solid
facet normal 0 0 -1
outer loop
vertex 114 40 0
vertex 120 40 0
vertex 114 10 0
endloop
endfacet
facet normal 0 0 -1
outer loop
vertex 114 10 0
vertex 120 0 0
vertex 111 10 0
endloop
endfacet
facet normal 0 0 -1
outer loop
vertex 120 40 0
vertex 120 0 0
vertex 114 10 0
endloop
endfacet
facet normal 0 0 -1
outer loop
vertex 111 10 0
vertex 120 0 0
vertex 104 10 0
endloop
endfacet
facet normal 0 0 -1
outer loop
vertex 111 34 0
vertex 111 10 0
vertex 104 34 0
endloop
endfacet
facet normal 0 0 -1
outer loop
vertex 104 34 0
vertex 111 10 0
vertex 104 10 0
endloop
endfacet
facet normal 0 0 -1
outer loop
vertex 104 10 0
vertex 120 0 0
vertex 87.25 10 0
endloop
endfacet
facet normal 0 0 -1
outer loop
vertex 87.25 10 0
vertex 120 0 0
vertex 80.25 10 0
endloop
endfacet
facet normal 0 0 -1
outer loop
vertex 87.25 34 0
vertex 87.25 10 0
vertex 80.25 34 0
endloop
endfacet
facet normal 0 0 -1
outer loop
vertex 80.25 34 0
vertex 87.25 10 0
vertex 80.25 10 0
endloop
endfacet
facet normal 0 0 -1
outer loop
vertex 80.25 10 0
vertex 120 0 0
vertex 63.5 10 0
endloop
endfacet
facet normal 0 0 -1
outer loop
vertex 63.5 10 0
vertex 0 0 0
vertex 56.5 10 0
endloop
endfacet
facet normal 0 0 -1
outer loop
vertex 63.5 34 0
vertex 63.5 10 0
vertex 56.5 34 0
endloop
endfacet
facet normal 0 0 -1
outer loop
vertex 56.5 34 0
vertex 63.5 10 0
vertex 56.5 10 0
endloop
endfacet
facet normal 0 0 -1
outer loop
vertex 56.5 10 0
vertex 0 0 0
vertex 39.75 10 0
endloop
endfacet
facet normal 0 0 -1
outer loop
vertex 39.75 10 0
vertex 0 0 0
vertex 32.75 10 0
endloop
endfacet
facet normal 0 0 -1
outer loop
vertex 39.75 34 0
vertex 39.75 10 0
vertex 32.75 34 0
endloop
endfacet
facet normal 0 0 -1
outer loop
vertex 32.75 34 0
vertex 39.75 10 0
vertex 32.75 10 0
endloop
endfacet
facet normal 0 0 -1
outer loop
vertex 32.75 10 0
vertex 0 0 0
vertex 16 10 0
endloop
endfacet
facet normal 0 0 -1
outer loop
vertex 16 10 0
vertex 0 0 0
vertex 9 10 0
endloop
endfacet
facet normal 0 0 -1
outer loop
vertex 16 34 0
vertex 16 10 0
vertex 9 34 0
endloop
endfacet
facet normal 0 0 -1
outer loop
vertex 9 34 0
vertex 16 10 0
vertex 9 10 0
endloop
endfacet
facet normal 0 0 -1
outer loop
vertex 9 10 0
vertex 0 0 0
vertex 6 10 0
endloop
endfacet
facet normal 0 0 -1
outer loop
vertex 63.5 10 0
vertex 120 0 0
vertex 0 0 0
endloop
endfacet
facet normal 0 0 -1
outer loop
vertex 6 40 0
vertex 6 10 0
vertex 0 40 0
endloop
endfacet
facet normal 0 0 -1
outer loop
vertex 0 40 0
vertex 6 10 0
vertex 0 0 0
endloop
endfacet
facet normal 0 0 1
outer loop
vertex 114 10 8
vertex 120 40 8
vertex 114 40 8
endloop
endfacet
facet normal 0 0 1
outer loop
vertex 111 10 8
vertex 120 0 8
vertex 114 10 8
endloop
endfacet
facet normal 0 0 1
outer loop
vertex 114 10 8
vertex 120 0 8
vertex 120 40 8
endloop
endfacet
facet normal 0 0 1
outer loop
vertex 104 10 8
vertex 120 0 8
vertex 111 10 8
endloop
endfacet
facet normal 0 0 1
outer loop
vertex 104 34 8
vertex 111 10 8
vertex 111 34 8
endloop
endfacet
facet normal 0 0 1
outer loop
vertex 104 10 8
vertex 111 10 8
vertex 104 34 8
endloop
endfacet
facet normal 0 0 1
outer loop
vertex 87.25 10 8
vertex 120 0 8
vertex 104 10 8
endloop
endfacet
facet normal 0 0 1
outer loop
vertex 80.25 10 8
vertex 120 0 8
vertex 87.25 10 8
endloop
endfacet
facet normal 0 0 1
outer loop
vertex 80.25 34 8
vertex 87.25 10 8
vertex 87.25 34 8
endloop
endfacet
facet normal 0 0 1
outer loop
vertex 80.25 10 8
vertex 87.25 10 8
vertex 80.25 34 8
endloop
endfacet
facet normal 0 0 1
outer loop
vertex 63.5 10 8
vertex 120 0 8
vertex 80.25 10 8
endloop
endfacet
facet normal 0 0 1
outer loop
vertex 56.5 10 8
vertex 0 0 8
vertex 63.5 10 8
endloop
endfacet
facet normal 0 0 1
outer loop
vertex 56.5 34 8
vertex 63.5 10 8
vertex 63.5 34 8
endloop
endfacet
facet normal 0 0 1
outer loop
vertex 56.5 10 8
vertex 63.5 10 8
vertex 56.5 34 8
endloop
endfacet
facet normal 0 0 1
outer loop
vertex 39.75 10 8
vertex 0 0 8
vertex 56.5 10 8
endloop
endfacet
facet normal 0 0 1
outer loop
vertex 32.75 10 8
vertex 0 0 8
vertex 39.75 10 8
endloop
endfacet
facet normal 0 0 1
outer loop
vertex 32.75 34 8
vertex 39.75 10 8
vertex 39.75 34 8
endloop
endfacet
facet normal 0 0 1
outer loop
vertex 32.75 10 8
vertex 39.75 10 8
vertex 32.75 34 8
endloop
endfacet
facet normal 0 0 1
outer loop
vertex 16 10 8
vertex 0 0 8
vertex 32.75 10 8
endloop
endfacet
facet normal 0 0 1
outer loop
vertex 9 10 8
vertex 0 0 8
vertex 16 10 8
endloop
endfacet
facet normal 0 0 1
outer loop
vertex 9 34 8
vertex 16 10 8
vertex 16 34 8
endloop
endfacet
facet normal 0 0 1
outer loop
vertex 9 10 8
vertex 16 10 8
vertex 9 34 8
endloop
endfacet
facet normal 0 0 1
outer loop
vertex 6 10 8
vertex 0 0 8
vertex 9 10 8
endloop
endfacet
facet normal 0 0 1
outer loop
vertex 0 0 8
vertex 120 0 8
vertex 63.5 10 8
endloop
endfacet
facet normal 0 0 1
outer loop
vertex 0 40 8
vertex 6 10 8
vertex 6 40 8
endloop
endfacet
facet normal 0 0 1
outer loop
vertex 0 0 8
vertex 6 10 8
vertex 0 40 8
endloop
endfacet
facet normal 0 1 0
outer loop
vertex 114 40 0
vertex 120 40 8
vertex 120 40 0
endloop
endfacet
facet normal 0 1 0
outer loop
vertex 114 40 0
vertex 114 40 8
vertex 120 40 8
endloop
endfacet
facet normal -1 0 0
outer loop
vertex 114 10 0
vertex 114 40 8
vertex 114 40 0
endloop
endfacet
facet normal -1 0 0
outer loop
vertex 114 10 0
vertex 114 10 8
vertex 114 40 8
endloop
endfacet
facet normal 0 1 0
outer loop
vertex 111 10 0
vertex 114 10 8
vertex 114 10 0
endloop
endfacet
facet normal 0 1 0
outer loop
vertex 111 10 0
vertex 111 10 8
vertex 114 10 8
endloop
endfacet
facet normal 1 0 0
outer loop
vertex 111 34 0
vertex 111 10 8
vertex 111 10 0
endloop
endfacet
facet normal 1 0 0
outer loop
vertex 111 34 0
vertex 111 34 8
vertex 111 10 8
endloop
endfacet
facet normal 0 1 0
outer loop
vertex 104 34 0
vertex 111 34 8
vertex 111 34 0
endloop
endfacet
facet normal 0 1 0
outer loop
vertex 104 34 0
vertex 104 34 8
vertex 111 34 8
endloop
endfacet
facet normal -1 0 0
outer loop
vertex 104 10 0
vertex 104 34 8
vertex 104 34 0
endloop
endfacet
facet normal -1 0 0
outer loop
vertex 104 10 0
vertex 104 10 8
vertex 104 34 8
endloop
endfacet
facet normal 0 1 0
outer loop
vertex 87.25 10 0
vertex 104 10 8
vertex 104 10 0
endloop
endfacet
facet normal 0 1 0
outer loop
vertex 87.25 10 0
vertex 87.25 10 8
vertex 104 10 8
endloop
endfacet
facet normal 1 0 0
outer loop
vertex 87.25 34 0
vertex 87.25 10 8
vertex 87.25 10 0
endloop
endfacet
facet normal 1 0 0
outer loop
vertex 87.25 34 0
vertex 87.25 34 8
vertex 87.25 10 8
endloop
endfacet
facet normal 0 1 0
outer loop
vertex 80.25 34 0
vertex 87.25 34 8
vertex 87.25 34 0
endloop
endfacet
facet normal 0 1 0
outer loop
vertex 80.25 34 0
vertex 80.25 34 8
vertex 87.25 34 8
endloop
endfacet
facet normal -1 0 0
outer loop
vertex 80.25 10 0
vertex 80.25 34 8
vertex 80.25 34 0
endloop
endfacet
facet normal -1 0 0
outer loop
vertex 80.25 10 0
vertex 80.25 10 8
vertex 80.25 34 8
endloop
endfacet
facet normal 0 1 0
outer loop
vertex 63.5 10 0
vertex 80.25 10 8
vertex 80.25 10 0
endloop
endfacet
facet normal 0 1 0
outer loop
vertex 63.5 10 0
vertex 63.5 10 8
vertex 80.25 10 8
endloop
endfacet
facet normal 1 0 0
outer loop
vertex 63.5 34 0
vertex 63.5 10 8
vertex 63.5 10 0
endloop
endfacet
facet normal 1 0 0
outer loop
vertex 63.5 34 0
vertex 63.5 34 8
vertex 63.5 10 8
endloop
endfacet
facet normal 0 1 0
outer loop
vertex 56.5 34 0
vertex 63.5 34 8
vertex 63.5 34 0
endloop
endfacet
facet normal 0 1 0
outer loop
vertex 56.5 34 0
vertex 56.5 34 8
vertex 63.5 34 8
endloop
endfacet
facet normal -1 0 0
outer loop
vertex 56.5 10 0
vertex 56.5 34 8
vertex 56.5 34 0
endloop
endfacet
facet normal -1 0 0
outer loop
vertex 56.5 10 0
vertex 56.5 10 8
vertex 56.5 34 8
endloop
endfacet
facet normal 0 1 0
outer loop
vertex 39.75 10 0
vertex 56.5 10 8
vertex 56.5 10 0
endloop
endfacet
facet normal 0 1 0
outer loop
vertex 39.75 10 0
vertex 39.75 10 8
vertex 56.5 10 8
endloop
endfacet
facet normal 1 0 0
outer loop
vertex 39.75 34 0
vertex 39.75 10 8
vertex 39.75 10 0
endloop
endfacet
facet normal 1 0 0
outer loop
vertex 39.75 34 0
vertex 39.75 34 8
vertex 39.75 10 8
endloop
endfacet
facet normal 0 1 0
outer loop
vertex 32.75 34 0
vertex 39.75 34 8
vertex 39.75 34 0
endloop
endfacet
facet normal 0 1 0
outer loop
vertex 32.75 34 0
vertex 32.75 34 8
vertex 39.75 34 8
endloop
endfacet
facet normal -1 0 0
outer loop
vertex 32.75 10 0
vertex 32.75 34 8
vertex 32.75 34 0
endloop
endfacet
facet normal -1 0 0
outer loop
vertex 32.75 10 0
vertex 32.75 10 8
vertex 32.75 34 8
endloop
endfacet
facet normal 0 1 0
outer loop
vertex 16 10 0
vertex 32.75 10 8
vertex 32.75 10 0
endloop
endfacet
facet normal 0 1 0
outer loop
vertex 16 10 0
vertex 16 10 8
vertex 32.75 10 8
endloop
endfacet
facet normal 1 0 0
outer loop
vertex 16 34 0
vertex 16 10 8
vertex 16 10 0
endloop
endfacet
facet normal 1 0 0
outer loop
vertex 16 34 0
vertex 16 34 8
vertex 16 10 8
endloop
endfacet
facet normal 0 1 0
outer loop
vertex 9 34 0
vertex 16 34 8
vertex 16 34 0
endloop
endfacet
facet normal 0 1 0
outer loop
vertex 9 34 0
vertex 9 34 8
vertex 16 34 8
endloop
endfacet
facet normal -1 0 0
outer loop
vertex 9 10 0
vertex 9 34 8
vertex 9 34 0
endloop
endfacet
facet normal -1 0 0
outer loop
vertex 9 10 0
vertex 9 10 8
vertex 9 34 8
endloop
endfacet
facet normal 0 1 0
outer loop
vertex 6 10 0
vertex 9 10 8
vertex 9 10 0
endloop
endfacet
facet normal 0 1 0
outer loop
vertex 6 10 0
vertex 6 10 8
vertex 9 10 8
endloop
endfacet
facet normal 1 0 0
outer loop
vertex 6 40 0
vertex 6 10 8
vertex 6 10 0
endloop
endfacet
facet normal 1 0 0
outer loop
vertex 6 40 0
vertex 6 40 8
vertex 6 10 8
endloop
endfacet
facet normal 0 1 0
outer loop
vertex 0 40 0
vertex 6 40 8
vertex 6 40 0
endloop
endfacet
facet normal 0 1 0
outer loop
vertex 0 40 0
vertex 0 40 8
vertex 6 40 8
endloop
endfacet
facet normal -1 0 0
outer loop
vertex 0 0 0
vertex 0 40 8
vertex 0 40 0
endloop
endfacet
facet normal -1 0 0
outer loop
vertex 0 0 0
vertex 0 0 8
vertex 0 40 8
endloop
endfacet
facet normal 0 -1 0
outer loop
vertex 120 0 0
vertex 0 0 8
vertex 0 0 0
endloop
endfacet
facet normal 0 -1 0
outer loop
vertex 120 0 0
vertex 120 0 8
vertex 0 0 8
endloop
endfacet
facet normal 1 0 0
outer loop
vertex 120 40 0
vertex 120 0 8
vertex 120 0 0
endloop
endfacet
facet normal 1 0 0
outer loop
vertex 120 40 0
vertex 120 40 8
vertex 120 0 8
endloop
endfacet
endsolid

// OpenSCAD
$fn = 32;

// ----------------------------------------------------------------------
// Guard grille: 5 slats over a 120 x 40 mm plate
// ----------------------------------------------------------------------

// --- parameters (mm) ---
profile_height = 8;       // extrusion height
profile_points = 28;      // points of the closed outline

profile = [[0, 0], [120, 0], [120, 40], [114, 40], [114, 10], [111, 10], [111, 34], [104, 34], [104, 10], [87.25, 10], [87.25, 34], [80.25, 34], [80.25, 10], [63.5, 10], [63.5, 34], [56.5, 34], [56.5, 10], [39.75, 10], [39.75, 34], [32.75, 34], [32.75, 10], [16, 10], [16, 34], [9, 34], [9, 10], [6, 10], [6, 40], [0, 40]];  // single closed polygon, 28 points, counter clockwise

// --- the one profile operation ---
linear_extrude(height = profile_height) polygon(points = profile);
